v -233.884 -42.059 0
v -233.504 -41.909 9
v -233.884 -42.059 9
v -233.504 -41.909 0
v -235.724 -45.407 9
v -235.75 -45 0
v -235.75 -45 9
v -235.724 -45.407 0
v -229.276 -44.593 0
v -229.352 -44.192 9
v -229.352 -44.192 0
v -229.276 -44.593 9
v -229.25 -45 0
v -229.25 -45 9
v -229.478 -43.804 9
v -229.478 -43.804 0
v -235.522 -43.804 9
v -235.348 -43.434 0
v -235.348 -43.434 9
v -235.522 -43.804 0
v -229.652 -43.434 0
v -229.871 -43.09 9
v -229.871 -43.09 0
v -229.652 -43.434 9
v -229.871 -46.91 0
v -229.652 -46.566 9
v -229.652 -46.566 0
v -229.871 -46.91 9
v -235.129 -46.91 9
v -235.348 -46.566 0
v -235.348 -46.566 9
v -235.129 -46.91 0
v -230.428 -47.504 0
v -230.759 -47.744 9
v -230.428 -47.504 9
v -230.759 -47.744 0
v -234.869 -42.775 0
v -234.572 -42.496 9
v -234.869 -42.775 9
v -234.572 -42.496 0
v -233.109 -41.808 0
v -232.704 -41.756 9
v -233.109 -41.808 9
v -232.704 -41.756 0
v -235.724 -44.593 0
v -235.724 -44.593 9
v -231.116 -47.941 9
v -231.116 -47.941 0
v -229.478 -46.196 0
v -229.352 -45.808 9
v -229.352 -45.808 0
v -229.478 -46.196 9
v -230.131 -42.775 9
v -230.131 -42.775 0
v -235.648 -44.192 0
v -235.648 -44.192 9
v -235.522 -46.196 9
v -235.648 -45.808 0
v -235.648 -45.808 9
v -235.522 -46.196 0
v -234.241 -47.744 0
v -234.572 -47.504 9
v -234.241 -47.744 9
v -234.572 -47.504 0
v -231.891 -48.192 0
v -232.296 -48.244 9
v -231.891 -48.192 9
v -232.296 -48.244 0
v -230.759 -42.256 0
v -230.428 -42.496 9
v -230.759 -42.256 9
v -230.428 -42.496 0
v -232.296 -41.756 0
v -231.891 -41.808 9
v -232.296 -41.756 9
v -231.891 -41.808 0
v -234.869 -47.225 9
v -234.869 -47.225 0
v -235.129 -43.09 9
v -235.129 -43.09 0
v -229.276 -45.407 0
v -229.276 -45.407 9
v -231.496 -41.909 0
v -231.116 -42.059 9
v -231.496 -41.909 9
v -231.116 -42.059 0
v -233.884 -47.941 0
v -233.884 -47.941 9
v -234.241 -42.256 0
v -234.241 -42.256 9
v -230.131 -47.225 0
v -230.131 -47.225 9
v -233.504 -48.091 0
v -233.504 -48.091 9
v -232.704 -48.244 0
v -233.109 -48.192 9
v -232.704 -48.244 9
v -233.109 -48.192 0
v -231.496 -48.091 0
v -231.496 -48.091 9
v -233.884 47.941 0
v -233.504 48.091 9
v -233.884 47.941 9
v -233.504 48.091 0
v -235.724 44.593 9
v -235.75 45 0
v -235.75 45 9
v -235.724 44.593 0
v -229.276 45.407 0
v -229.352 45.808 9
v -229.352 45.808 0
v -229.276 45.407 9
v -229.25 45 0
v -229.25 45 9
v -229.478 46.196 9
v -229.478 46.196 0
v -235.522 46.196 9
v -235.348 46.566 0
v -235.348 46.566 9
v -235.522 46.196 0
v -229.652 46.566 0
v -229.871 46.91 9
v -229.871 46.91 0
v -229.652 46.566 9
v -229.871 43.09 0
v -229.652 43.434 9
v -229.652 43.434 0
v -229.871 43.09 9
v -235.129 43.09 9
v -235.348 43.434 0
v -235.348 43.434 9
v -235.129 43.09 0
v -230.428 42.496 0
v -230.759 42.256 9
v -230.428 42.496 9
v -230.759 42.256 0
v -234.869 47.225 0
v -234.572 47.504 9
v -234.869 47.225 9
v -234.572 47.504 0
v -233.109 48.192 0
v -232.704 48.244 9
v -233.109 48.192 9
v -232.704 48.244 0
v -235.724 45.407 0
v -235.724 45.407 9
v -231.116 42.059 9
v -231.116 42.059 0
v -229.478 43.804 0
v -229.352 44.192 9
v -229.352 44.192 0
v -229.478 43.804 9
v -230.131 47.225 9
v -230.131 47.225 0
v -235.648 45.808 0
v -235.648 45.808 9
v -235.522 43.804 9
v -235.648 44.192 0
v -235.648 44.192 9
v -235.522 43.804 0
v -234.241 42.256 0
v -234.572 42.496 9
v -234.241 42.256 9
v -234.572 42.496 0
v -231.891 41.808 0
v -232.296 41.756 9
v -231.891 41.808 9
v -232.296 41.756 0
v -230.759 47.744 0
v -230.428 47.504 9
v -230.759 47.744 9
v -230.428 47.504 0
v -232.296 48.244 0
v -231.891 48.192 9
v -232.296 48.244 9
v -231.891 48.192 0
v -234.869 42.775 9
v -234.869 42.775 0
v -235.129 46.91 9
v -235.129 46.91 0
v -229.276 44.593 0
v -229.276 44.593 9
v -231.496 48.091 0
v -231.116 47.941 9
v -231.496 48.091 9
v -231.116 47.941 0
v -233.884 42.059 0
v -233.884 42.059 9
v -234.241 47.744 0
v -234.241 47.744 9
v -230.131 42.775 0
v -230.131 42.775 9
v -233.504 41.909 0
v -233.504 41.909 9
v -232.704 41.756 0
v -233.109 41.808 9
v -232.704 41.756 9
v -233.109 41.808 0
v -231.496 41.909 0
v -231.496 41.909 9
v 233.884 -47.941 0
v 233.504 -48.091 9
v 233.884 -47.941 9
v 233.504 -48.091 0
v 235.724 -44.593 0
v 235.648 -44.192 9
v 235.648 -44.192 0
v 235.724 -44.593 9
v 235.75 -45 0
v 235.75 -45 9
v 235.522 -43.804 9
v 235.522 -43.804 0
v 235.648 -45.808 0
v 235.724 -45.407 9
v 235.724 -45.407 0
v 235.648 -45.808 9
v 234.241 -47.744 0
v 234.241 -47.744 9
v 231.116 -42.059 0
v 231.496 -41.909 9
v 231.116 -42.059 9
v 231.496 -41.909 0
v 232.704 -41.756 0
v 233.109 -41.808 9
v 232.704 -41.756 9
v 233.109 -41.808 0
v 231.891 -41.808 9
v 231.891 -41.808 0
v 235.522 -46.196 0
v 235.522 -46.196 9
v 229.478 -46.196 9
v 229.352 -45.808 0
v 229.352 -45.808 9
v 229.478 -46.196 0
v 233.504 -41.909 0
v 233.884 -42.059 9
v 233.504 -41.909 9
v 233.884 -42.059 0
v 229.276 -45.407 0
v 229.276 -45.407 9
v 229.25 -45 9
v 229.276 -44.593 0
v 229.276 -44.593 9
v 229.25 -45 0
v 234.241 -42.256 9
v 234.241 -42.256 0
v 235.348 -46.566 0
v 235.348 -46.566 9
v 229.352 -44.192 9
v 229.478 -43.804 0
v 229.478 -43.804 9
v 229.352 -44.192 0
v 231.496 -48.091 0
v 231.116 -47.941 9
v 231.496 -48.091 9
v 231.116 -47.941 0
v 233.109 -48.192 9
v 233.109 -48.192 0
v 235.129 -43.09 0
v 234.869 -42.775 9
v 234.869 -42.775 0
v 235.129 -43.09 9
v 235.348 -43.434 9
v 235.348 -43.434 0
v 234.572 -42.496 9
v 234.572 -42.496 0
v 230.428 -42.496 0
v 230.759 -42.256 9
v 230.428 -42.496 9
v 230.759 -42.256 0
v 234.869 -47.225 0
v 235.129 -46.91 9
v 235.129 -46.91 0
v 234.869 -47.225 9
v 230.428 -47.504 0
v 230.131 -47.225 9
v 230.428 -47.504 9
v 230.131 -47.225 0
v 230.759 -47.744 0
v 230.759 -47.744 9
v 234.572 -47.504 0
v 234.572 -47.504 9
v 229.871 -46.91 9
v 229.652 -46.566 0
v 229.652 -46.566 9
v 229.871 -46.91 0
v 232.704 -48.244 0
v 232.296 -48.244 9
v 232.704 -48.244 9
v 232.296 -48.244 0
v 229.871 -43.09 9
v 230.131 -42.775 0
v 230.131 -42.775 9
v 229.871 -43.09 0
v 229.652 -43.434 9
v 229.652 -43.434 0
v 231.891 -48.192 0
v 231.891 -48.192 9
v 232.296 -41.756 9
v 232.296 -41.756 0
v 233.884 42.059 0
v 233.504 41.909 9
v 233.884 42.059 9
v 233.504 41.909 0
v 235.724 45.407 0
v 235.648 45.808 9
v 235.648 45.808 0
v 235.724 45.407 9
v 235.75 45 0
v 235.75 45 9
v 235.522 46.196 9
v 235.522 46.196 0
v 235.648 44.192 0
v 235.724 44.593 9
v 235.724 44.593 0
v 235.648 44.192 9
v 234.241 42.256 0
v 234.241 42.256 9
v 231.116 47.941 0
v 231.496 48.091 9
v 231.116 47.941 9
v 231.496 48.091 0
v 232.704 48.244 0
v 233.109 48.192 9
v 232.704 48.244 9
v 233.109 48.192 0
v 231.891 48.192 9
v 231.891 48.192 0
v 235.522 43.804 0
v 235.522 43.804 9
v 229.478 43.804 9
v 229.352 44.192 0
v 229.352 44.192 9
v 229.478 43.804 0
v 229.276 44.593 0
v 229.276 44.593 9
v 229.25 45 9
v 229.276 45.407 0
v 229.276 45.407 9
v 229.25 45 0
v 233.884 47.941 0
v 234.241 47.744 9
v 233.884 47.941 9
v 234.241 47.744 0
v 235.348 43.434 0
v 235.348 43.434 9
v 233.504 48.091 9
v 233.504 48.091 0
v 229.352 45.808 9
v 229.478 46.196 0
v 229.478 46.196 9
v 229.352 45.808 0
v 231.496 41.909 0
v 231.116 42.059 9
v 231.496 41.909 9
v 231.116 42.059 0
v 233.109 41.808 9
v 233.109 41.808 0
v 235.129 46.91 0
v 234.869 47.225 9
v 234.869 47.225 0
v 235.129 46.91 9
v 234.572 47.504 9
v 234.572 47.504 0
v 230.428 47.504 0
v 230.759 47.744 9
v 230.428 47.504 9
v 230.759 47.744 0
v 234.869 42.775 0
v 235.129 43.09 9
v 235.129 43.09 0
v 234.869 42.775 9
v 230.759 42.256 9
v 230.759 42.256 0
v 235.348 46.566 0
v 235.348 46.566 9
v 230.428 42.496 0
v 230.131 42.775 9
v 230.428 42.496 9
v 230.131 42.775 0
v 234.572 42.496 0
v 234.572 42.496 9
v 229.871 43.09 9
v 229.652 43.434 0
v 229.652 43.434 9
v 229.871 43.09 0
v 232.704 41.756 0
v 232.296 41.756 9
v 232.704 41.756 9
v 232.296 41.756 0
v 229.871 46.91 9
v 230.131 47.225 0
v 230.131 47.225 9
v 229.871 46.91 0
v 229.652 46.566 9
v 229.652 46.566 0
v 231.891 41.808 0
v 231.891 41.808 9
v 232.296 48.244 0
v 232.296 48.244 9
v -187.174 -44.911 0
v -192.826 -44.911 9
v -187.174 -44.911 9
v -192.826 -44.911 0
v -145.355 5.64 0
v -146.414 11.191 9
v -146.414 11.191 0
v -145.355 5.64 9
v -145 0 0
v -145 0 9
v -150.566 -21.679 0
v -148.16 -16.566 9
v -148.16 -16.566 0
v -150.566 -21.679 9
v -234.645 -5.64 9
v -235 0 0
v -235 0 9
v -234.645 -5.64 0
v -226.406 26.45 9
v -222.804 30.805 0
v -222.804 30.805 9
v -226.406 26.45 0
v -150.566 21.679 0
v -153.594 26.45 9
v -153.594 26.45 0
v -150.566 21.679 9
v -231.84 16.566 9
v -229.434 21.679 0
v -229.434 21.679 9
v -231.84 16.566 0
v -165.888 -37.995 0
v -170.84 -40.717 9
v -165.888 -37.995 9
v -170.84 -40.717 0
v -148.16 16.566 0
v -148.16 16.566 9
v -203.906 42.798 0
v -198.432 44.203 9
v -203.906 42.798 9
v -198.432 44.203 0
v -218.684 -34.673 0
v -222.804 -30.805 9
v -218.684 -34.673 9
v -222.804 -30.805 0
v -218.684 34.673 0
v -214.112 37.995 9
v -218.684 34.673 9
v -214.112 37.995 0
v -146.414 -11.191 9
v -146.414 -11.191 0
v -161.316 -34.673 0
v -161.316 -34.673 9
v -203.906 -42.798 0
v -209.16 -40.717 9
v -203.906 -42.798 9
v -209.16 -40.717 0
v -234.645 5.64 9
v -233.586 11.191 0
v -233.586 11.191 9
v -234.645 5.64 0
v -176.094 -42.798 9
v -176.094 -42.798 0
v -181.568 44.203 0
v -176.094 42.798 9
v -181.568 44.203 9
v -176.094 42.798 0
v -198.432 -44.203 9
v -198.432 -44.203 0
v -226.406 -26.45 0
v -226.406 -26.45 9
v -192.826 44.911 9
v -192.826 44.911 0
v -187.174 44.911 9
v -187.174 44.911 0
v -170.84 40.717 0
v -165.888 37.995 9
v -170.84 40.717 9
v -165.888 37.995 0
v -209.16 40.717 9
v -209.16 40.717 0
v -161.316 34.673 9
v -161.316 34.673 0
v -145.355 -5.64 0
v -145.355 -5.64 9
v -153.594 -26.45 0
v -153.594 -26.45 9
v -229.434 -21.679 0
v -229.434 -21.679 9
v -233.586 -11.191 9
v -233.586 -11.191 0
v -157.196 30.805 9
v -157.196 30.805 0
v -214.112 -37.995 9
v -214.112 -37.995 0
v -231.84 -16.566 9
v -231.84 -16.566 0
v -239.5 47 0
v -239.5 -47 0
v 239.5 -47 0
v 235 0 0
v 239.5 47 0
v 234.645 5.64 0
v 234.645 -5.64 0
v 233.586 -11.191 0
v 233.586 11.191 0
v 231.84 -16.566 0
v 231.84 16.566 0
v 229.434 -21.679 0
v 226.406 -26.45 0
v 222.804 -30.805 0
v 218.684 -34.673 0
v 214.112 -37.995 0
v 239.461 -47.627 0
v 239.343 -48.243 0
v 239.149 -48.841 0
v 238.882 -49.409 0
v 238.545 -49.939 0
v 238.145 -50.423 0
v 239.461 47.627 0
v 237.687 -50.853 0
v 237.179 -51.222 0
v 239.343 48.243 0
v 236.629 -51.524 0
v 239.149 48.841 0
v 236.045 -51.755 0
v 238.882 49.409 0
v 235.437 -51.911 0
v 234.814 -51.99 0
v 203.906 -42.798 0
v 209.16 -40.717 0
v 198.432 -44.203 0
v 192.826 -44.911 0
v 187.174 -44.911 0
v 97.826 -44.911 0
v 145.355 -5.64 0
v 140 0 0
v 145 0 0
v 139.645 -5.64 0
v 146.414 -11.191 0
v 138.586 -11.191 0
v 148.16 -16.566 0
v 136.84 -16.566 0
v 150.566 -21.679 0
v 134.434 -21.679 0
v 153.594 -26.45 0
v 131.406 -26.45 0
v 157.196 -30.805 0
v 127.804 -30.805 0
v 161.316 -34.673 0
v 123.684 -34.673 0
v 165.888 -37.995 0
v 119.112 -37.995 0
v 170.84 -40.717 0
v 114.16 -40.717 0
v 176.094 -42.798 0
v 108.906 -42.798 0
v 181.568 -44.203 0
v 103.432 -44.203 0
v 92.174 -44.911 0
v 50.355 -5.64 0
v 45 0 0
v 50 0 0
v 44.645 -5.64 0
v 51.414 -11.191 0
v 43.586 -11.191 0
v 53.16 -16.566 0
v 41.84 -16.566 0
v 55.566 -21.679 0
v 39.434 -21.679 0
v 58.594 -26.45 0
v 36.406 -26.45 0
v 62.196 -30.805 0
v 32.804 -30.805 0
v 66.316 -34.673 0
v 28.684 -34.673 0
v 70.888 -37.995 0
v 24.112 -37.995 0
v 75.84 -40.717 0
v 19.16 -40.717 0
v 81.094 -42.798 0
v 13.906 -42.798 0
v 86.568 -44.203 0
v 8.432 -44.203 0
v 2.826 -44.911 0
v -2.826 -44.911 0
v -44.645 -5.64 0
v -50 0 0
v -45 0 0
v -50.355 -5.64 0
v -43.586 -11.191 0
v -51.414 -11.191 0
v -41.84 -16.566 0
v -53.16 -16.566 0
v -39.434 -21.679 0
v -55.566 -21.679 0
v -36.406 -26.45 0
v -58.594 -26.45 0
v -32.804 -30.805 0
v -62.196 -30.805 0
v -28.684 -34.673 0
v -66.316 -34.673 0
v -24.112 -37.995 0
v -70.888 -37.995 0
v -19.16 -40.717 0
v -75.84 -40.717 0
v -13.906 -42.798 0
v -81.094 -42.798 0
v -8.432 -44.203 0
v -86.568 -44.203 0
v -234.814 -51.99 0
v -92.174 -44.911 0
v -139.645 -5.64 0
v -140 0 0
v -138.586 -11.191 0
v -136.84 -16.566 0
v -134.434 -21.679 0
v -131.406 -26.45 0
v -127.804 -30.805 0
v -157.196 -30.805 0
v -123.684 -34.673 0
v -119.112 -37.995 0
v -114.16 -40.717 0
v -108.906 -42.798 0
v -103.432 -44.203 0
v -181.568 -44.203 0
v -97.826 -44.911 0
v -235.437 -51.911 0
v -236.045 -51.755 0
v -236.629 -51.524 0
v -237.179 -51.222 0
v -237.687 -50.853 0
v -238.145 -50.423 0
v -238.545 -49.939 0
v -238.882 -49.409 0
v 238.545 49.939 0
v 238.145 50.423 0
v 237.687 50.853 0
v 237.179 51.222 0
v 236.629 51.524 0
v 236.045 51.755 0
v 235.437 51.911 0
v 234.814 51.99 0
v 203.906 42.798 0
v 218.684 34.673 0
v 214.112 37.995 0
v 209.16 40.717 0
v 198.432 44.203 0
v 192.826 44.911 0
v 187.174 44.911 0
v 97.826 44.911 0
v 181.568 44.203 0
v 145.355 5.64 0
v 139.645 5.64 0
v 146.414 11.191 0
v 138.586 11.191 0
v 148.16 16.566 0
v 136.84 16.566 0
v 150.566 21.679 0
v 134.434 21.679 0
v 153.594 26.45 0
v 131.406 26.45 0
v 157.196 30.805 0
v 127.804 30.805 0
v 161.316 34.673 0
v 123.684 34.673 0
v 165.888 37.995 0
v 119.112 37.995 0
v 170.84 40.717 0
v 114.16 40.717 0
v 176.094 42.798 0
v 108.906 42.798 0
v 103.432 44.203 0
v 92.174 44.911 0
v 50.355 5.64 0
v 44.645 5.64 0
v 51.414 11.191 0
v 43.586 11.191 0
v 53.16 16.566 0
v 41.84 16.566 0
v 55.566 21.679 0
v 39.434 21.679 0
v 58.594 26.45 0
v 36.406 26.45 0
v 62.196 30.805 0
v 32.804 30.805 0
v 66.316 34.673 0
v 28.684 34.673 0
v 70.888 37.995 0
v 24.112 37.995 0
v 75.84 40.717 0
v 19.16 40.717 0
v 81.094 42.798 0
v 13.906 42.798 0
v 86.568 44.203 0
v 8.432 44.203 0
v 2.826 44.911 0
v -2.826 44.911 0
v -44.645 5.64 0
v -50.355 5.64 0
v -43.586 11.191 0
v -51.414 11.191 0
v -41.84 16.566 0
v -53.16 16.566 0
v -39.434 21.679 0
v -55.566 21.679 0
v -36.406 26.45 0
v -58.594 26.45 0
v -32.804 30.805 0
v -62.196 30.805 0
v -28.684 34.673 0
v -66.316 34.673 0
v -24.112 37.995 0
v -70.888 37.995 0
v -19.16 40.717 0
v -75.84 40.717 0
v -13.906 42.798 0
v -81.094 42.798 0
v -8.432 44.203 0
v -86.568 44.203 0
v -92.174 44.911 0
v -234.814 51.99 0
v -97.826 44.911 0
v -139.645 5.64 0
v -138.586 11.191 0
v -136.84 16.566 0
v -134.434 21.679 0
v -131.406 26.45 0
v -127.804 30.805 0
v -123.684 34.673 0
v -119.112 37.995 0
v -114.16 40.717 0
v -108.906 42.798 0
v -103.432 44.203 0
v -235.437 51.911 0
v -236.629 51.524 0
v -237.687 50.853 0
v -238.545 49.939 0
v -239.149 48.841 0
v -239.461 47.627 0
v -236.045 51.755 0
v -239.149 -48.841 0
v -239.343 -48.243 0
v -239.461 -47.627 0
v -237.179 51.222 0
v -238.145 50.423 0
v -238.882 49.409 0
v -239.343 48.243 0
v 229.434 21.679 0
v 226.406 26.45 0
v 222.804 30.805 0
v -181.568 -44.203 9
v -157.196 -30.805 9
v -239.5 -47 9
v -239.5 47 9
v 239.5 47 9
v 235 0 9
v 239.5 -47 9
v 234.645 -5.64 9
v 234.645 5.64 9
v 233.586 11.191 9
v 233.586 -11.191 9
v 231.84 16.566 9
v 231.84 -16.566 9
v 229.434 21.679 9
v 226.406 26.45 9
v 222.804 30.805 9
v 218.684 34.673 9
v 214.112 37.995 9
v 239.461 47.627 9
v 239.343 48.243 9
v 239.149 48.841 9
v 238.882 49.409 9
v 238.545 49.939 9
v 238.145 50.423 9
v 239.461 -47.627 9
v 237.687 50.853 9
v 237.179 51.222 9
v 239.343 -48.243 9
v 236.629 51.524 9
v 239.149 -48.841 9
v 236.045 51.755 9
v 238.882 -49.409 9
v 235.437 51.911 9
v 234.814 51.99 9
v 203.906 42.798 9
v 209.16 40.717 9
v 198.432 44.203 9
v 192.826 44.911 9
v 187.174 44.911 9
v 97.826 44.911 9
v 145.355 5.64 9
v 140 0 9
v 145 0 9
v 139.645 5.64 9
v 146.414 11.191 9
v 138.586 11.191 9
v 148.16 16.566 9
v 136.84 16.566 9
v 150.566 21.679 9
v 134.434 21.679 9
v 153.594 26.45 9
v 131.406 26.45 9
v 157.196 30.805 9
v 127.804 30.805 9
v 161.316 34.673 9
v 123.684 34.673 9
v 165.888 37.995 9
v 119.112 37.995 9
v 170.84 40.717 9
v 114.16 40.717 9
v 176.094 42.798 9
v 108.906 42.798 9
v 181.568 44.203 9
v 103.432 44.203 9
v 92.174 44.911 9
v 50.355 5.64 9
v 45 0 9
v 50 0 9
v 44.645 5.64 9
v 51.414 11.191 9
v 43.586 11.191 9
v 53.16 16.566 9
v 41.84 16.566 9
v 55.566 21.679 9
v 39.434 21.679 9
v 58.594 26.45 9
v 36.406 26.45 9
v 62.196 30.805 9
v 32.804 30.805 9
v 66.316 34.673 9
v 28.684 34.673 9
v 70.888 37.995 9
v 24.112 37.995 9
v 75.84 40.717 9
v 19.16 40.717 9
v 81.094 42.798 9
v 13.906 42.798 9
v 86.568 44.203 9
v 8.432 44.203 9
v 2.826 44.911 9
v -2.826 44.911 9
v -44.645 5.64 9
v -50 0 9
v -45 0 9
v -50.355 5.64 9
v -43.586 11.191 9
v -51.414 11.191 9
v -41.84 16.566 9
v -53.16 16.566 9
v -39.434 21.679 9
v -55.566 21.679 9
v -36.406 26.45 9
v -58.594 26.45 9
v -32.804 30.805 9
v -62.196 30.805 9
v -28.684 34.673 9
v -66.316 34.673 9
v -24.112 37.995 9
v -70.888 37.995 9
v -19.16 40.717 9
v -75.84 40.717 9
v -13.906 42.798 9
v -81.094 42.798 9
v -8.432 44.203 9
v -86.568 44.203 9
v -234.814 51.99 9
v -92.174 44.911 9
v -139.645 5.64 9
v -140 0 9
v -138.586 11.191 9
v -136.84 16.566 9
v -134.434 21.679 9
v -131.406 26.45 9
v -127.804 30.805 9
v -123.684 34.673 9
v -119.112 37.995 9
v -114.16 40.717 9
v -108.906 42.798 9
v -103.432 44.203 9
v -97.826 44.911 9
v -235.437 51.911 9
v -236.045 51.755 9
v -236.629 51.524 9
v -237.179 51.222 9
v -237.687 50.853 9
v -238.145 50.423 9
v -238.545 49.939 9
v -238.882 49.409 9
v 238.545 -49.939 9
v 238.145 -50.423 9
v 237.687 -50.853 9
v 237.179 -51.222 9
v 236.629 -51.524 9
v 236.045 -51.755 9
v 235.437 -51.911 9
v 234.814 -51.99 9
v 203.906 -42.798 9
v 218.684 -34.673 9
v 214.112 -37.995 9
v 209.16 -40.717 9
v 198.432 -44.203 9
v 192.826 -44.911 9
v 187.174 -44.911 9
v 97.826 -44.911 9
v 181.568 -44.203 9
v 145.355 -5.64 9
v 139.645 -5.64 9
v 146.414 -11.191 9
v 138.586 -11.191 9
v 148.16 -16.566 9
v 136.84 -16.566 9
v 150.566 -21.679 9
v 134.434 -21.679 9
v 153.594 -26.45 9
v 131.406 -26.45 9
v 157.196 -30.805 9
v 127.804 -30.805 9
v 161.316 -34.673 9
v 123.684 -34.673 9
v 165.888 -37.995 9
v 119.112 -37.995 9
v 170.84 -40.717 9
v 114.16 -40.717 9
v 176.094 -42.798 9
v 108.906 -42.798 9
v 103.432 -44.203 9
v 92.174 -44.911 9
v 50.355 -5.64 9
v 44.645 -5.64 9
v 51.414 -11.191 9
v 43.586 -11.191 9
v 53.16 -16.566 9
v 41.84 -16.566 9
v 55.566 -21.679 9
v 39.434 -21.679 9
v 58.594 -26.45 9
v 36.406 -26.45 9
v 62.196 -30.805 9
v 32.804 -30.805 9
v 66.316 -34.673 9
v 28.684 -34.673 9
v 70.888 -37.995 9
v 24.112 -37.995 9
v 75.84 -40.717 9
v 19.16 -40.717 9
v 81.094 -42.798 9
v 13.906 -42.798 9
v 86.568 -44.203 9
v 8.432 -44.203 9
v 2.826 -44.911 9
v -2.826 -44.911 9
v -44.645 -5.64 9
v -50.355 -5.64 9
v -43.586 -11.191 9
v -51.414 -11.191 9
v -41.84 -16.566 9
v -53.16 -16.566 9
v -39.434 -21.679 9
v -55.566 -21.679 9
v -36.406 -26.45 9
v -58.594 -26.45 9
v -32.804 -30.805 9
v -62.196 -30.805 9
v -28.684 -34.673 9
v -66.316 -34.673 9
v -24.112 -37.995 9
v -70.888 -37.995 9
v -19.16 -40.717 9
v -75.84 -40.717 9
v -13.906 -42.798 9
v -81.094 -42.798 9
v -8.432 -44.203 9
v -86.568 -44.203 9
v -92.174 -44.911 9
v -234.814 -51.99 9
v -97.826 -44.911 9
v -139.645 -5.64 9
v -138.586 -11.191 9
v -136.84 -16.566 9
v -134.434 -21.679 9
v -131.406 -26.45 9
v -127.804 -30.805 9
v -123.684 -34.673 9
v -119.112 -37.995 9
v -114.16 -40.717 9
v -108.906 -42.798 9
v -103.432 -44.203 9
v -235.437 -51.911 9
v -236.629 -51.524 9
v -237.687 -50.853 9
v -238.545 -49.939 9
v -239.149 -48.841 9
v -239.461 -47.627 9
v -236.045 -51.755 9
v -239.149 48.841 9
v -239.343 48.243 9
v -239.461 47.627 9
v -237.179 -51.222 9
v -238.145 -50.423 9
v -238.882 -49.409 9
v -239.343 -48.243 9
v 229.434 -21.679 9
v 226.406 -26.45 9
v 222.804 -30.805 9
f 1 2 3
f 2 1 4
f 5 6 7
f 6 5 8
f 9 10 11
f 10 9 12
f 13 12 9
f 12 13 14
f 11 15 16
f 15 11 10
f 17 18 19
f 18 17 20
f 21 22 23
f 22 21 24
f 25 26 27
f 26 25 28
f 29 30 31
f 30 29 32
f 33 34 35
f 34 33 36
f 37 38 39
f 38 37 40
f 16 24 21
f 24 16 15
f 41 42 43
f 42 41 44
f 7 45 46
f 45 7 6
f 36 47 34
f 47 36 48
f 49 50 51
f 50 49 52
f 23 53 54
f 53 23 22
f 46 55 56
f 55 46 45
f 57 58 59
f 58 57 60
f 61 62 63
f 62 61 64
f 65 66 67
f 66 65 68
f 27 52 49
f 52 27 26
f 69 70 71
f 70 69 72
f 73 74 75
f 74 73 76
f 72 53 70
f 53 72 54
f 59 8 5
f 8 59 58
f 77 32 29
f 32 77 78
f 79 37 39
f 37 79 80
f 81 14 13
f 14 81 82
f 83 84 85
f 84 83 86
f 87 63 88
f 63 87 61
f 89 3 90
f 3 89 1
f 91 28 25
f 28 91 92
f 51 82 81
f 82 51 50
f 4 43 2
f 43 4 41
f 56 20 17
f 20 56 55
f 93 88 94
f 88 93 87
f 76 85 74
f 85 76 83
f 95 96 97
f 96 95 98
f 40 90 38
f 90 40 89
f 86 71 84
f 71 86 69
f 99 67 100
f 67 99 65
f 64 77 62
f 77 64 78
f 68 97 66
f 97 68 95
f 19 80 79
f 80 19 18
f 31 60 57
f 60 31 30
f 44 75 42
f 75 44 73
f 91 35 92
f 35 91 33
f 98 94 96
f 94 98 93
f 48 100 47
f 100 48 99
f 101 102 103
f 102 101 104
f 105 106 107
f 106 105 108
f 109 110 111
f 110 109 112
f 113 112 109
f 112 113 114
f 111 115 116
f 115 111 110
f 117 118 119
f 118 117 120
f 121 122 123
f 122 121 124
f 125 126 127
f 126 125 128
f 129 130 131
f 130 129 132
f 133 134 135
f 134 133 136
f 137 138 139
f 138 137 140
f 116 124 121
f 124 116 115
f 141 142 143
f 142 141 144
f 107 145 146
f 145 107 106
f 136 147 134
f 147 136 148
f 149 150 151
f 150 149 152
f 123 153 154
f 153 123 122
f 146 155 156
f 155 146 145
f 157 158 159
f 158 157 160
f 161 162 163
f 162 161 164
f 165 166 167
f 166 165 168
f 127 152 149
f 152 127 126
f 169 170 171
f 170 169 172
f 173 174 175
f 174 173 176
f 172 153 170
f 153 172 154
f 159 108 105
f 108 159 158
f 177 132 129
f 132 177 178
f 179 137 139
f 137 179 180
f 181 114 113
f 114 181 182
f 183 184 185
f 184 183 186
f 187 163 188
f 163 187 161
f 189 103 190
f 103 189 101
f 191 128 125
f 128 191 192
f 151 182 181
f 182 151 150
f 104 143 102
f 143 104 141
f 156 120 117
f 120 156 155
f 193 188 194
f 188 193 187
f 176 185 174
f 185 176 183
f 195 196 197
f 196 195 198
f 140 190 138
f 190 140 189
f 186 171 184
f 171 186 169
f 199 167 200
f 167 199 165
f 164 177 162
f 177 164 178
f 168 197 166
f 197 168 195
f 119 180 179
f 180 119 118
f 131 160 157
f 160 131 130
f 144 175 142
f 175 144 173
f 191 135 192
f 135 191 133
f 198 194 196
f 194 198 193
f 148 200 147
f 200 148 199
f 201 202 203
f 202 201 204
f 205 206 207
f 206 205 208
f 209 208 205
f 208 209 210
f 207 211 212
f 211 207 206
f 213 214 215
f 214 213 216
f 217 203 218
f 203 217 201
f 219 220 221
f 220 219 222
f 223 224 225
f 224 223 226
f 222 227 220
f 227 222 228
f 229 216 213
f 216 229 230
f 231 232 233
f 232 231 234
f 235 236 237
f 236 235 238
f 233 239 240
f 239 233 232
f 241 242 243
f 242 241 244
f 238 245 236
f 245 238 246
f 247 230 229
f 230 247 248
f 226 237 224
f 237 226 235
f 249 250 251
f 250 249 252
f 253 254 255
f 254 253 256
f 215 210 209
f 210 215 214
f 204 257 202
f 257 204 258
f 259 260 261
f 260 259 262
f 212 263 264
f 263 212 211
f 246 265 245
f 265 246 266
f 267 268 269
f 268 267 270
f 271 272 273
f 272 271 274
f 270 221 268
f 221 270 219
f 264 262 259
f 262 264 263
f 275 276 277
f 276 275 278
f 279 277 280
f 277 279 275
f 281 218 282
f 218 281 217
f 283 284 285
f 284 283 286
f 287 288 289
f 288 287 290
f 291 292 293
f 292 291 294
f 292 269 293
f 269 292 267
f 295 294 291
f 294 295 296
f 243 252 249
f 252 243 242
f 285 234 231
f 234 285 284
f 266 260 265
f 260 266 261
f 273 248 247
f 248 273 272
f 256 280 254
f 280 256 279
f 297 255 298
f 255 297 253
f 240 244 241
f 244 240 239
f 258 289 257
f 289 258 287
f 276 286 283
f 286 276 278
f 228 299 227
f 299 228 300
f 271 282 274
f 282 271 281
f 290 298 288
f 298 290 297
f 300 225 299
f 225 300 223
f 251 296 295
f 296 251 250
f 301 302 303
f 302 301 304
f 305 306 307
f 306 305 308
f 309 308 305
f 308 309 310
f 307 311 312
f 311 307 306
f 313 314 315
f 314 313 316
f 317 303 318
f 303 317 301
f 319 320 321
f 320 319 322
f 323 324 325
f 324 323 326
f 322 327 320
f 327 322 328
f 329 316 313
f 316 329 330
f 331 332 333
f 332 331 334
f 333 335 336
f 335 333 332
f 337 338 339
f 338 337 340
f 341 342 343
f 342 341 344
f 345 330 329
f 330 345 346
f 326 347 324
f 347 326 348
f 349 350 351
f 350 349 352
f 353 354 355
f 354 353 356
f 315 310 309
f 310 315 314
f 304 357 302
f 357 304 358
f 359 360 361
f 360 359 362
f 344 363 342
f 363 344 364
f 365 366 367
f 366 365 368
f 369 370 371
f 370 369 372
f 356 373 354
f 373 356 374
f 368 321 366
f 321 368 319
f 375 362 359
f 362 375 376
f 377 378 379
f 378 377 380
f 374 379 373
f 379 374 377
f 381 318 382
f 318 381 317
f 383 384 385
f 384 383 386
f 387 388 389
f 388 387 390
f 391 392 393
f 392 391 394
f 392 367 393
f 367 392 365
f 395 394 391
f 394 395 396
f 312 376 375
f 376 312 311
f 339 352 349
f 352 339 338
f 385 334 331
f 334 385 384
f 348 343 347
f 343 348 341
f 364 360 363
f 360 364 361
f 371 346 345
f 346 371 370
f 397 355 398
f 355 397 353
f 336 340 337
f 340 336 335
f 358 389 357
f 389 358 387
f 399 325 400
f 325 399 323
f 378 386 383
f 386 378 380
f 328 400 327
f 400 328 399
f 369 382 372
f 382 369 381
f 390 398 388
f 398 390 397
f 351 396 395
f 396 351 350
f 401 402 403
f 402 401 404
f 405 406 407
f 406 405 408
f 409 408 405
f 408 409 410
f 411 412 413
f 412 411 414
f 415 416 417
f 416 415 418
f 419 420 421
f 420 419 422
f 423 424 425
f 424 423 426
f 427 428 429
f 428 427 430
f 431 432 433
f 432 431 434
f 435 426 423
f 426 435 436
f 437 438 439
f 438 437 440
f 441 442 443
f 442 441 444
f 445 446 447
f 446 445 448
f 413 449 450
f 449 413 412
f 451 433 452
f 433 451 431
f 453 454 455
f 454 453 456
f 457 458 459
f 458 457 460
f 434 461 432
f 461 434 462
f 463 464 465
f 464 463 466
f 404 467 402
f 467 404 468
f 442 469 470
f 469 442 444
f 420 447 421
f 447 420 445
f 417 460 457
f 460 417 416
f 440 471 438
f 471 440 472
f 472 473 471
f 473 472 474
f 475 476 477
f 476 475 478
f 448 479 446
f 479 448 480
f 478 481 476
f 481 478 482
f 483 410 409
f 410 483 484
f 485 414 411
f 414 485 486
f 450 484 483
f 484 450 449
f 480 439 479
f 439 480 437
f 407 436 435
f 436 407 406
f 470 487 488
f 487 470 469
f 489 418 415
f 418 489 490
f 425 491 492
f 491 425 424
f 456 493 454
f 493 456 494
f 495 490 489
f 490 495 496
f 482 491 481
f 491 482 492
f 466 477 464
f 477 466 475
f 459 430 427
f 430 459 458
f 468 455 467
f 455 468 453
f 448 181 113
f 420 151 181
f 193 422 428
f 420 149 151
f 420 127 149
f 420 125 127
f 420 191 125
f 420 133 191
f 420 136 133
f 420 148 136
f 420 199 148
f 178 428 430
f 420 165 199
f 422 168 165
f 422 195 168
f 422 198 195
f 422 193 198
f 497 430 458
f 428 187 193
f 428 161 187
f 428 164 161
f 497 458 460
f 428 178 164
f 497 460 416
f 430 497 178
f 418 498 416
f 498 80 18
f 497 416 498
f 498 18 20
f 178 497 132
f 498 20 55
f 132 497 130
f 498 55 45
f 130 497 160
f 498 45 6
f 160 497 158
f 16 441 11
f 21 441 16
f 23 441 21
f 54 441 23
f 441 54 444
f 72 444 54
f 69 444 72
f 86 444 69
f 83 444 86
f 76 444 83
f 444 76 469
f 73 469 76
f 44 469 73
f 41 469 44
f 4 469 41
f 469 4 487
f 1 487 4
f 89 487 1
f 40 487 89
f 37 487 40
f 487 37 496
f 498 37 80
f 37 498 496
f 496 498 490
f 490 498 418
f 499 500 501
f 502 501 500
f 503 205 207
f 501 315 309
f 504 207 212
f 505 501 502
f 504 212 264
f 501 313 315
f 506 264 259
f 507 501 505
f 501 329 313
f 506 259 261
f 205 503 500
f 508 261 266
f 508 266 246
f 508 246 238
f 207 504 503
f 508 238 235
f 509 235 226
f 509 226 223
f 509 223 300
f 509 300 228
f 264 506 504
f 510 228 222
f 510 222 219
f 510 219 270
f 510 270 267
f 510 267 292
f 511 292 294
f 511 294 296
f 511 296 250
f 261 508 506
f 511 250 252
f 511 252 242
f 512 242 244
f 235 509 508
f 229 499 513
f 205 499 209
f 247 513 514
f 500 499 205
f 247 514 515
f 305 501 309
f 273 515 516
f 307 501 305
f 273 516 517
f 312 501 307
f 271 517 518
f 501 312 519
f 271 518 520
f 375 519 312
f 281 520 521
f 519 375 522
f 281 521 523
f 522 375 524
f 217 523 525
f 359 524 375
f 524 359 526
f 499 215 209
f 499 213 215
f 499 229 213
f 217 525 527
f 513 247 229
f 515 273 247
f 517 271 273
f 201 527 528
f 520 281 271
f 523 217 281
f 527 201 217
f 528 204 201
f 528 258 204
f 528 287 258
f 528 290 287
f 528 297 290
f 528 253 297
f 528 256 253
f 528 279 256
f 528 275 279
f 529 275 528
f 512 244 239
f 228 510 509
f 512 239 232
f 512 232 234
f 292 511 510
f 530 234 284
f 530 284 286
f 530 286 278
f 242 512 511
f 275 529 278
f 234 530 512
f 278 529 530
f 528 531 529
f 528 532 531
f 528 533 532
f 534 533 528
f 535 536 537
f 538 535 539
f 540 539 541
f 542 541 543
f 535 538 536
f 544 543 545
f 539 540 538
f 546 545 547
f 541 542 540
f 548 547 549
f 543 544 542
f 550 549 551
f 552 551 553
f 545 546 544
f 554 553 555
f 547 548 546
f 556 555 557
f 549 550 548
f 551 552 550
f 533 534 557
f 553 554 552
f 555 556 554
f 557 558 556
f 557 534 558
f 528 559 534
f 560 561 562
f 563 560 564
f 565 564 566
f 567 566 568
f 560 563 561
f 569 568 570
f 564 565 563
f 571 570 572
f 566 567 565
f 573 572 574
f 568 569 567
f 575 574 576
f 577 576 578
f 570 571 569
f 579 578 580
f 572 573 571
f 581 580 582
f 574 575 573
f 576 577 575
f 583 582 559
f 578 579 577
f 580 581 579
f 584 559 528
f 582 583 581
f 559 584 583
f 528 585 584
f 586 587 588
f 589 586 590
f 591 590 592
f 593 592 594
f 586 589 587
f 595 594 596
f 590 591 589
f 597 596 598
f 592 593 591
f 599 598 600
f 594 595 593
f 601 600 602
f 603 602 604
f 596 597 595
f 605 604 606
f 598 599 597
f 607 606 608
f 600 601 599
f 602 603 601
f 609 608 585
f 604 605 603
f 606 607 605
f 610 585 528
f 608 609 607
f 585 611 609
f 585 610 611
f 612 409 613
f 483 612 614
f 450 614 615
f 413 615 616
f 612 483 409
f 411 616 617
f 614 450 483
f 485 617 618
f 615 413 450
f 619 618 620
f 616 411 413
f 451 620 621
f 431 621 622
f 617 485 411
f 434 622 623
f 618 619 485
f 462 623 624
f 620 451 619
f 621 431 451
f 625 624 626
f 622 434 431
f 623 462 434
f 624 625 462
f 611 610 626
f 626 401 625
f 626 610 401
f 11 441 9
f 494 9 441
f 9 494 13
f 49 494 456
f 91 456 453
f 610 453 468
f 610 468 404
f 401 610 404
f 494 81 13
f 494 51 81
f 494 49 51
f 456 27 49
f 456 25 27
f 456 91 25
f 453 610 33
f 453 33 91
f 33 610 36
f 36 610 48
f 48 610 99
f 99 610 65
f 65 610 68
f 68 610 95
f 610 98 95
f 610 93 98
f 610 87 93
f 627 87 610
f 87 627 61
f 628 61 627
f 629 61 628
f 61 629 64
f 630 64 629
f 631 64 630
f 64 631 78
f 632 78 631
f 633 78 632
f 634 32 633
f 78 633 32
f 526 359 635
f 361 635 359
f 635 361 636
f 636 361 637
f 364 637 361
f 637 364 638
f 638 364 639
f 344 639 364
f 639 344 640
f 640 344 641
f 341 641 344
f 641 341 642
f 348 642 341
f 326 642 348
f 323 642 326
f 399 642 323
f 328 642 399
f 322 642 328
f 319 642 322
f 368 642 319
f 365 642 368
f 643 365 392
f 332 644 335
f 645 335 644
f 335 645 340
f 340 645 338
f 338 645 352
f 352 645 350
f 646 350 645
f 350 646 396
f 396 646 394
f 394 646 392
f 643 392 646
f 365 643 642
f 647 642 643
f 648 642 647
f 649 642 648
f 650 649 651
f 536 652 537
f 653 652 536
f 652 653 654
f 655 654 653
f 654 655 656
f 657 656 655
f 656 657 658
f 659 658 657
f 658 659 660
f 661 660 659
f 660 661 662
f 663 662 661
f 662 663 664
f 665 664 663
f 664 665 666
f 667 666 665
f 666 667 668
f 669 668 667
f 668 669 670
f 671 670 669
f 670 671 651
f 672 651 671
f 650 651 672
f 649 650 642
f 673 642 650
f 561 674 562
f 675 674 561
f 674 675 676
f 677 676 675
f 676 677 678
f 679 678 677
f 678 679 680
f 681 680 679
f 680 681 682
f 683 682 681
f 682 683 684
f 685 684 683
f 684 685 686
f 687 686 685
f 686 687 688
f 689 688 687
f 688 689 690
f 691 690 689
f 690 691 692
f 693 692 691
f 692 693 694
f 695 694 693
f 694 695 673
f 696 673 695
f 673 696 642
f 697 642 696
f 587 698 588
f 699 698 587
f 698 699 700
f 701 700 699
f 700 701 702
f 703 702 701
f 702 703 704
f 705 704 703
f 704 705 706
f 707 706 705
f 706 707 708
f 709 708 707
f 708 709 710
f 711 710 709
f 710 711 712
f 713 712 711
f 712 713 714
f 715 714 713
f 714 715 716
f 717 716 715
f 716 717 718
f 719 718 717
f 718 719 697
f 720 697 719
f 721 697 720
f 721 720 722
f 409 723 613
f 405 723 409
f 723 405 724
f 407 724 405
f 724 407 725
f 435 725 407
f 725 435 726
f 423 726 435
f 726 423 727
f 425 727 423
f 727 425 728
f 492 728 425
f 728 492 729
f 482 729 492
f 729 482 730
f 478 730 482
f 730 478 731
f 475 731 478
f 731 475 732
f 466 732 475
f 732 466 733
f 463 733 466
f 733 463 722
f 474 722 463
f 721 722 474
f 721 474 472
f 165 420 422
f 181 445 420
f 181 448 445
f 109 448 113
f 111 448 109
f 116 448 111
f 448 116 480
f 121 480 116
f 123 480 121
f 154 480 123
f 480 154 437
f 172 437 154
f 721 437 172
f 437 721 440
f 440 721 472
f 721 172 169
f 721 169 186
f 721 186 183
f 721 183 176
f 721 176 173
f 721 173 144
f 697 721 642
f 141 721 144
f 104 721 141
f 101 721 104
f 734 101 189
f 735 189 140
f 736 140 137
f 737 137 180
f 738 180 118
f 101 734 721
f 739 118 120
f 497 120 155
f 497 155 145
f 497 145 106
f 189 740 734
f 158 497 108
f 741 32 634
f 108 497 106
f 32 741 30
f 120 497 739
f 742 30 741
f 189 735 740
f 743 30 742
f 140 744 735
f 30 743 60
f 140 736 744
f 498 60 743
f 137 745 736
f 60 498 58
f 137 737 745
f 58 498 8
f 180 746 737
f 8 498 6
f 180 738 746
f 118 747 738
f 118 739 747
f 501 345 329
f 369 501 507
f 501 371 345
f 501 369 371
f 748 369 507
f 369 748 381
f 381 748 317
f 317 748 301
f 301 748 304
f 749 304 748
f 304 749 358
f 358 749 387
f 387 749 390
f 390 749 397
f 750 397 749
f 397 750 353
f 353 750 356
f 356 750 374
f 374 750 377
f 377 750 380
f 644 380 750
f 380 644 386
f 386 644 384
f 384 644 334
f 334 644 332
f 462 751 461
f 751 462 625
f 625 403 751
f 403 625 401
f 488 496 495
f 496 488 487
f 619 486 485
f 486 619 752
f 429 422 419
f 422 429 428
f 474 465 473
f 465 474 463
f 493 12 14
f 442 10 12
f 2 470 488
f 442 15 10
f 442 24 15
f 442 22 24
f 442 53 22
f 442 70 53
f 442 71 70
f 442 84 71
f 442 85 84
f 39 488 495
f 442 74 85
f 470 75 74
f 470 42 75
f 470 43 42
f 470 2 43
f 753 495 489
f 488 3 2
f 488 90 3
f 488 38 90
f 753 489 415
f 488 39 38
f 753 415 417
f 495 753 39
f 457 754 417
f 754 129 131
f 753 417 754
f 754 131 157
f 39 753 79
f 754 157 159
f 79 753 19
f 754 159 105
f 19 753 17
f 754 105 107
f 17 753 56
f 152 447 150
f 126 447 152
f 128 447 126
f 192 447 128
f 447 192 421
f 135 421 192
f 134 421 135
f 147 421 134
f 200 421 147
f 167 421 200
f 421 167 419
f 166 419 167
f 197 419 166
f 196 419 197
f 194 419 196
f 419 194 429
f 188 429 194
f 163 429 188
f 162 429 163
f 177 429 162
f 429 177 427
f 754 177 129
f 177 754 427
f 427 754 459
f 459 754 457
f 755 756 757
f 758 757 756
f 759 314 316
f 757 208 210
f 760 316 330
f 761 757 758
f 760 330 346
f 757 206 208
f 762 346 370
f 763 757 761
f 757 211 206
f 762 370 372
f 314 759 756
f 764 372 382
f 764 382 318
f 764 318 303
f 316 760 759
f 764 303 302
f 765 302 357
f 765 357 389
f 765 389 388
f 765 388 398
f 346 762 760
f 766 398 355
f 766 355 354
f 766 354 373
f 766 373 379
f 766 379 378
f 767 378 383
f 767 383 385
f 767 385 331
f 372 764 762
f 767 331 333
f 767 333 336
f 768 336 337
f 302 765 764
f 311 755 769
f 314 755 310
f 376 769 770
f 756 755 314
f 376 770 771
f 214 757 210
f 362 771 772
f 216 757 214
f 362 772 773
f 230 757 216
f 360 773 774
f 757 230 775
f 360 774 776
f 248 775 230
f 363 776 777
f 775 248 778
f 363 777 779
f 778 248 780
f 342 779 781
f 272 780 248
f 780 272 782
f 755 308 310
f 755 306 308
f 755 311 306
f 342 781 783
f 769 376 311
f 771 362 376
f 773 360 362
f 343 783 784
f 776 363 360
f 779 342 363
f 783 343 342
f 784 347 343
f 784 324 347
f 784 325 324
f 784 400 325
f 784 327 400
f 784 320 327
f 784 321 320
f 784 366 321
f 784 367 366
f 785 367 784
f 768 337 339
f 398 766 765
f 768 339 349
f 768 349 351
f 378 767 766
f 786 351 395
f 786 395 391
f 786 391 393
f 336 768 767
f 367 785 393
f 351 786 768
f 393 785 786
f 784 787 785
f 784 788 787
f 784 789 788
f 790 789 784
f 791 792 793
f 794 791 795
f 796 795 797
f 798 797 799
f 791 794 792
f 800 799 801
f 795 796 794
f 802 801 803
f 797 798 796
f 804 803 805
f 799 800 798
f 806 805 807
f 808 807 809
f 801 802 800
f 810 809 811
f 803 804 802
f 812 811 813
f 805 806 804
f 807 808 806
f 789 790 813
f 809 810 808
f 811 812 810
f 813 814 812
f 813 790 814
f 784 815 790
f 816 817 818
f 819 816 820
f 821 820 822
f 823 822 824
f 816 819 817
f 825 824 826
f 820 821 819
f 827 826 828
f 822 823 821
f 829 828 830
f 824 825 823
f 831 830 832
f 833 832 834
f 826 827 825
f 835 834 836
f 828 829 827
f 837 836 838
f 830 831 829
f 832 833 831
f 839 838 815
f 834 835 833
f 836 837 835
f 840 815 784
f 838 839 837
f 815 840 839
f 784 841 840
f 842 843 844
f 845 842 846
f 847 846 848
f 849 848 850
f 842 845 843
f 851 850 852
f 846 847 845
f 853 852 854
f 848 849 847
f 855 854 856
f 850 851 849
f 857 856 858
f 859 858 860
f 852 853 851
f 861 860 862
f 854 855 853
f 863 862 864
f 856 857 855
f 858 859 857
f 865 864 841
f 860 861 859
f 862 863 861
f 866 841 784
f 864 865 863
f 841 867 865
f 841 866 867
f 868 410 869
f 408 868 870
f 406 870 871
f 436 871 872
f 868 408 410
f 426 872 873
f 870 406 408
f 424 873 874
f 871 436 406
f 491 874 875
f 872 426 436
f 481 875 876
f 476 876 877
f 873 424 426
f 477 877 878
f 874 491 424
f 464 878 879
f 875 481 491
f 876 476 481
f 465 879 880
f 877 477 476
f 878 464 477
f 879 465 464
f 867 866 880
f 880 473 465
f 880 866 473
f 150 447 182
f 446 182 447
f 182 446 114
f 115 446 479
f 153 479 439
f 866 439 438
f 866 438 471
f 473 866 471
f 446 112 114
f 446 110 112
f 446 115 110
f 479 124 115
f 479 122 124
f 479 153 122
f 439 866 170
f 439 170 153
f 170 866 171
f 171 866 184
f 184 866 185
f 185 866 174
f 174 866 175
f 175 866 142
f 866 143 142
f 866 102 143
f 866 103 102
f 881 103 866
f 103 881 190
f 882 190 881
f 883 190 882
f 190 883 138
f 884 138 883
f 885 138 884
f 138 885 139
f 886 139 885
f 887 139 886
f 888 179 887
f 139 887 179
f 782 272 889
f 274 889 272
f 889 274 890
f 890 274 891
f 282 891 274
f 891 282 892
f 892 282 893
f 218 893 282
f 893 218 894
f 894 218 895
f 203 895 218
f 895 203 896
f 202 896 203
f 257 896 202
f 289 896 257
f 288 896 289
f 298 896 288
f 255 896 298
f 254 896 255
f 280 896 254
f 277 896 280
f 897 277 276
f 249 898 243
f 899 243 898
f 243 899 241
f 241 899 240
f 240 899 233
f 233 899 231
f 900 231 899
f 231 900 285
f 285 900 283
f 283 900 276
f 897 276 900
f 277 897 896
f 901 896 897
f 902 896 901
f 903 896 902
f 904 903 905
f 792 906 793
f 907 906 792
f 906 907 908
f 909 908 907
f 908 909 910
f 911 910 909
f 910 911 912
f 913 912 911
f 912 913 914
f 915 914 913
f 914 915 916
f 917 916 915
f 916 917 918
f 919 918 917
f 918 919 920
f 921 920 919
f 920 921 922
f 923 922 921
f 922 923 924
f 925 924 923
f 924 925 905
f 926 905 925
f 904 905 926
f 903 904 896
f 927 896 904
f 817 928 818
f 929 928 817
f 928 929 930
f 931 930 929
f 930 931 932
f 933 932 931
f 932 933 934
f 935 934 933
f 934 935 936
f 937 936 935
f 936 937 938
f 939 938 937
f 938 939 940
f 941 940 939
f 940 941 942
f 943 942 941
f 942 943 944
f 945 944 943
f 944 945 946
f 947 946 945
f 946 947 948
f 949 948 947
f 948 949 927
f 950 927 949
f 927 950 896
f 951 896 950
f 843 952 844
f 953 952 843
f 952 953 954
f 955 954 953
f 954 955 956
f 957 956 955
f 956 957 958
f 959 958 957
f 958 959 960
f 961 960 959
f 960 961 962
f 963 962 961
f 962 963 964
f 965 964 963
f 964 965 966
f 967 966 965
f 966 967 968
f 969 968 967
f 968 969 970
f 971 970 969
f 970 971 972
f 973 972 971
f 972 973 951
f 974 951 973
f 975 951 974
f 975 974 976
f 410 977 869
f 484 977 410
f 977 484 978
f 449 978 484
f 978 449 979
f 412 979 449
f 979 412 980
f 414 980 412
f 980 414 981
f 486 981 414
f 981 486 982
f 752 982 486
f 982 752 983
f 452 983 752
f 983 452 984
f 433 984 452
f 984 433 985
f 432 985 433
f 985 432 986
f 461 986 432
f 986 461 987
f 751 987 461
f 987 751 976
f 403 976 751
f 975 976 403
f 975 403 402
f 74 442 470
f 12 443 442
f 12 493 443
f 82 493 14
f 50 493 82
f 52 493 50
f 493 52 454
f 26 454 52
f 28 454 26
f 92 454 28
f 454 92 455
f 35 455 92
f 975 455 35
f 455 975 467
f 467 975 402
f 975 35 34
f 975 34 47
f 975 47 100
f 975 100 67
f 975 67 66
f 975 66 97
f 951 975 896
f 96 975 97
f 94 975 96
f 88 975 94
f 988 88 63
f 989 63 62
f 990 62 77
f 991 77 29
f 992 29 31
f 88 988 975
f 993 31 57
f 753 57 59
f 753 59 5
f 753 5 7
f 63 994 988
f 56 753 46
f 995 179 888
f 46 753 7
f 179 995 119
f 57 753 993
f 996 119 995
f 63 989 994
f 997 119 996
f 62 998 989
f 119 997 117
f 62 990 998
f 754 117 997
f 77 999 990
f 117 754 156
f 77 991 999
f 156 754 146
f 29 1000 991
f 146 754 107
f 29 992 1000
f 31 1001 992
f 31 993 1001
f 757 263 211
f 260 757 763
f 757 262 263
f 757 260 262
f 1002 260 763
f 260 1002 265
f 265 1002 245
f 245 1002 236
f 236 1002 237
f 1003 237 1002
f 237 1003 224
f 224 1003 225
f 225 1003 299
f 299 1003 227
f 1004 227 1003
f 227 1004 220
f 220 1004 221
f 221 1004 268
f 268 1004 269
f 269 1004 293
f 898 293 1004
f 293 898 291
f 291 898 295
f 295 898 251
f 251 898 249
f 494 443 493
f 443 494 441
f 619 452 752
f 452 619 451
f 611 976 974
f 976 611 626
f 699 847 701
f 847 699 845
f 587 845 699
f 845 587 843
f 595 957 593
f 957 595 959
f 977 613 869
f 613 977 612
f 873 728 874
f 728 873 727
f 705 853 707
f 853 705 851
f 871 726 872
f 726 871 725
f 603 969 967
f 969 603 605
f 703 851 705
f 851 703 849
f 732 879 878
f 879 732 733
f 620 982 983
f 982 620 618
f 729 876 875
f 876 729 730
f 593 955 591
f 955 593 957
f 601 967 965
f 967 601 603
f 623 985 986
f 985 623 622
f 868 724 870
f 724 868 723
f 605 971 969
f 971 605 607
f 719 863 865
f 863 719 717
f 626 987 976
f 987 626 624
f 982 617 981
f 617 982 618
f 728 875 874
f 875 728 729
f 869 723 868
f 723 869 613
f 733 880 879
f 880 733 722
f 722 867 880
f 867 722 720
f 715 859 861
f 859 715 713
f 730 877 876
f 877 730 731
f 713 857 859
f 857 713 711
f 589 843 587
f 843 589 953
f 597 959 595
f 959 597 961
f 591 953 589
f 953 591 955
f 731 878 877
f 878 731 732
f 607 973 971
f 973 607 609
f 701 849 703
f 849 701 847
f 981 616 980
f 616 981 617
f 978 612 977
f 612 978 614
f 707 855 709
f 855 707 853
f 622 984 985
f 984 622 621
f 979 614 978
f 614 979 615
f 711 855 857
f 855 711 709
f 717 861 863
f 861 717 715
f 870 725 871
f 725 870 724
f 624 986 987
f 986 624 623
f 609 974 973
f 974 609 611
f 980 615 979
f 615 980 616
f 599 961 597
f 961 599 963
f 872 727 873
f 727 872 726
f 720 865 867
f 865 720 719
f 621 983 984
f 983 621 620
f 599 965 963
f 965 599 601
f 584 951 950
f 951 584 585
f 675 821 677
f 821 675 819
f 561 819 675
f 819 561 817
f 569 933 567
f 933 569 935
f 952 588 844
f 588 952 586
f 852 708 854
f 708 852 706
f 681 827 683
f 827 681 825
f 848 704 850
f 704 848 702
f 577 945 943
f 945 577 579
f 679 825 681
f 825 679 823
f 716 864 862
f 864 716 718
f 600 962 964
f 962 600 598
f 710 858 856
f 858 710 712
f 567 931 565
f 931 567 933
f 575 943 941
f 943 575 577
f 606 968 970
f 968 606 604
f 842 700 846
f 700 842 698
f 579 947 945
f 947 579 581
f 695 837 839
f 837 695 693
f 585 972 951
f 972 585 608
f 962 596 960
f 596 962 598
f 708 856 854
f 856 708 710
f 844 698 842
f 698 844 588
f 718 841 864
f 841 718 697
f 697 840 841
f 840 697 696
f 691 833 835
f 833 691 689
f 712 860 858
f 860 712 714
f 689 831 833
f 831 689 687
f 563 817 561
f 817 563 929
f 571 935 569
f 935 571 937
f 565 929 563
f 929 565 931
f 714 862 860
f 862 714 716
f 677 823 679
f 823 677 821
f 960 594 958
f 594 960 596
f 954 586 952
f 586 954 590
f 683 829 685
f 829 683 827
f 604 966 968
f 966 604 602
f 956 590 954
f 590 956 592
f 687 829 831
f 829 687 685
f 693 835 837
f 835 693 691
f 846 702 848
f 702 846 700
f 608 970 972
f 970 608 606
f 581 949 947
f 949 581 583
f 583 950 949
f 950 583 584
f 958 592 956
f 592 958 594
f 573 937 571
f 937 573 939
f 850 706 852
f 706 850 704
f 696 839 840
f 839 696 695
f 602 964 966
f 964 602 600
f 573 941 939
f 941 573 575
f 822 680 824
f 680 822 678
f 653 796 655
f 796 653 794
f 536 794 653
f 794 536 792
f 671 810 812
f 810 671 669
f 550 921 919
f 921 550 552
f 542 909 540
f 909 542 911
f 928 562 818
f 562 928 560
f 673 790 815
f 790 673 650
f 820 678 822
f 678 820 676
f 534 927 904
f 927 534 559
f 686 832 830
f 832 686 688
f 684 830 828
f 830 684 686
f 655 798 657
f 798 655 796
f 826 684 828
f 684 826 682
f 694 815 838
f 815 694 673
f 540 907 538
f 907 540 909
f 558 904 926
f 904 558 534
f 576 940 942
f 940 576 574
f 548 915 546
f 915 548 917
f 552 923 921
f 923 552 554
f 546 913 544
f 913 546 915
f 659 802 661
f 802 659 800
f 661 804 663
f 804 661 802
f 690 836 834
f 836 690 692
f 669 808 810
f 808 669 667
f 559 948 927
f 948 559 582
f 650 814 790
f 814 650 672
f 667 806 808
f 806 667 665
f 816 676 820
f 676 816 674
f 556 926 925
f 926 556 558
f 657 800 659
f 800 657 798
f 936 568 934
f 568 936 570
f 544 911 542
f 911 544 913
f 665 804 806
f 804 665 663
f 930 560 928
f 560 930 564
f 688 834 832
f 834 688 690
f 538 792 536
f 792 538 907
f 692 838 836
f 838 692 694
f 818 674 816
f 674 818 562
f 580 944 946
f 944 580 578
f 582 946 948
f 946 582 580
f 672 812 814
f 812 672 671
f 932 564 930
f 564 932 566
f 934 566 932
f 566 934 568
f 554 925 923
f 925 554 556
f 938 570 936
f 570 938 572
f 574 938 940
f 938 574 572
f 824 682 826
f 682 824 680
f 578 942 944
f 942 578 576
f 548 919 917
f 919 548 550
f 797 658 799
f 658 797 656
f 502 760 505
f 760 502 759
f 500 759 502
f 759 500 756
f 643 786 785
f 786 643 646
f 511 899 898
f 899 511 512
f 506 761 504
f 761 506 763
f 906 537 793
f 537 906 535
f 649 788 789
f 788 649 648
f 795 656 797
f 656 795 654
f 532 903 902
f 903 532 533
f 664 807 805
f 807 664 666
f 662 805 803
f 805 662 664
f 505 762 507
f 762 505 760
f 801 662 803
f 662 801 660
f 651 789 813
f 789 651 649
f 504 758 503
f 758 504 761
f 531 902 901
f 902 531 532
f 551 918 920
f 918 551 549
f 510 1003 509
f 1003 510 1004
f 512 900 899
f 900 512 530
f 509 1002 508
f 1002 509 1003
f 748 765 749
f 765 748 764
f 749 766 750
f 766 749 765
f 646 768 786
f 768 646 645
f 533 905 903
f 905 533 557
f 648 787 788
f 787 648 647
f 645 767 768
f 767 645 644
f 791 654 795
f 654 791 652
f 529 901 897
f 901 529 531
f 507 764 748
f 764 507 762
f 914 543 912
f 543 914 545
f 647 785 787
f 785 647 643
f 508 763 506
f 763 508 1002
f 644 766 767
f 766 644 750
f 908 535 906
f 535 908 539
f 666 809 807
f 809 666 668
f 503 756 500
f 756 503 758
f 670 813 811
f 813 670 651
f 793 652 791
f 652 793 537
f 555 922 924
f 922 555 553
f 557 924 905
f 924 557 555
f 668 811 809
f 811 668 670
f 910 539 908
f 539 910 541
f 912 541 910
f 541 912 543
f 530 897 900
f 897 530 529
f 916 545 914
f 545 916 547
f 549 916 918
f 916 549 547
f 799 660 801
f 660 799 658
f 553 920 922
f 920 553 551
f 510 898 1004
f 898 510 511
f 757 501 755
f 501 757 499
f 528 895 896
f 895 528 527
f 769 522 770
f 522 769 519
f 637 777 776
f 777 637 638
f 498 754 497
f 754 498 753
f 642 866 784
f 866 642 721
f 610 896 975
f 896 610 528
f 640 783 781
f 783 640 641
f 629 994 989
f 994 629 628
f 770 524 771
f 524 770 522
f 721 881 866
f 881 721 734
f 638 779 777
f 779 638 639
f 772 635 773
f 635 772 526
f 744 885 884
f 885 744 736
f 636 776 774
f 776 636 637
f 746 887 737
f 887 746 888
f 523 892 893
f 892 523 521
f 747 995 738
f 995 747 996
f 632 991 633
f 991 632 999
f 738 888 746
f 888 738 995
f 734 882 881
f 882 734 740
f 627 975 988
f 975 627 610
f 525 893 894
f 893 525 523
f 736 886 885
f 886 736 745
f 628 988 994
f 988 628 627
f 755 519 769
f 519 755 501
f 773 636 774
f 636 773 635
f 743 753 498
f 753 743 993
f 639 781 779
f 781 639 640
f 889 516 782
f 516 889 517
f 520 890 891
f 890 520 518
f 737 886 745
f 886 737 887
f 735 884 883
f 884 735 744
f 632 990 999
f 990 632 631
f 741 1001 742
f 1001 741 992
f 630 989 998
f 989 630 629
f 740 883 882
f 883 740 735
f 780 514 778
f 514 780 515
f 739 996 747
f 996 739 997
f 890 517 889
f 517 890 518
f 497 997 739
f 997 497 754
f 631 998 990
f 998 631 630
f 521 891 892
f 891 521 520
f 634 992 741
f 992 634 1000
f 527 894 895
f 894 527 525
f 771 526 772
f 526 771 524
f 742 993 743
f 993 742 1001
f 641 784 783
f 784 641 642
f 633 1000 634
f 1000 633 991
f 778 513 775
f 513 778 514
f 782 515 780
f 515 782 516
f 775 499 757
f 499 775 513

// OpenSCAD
$fn = 50;

difference() {
	union() {
		hull() {
			translate(v = [-234.5, 47.0, 0]) {
				cylinder(h = 9, r = 5);
			}
			translate(v = [234.5, 47.0, 0]) {
				cylinder(h = 9, r = 5);
			}
			translate(v = [-234.5, -47.0, 0]) {
				cylinder(h = 9, r = 5);
			}
			translate(v = [234.5, -47.0, 0]) {
				cylinder(h = 9, r = 5);
			}
		}
	}
	union() {
		translate(v = [-232.5, -45.0, -100.0]) {
			cylinder(h = 200, r = 3.25);
		}
		translate(v = [-232.5, 45.0, -100.0]) {
			cylinder(h = 200, r = 3.25);
		}
		translate(v = [232.5, -45.0, -100.0]) {
			cylinder(h = 200, r = 3.25);
		}
		translate(v = [232.5, 45.0, -100.0]) {
			cylinder(h = 200, r = 3.25);
		}
		translate(v = [-232.5, -45.0, -100.0]) {
			cylinder(h = 200, r = 1.8);
		}
		translate(v = [-232.5, 45.0, -100.0]) {
			cylinder(h = 200, r = 1.8);
		}
		translate(v = [232.5, -45.0, -100.0]) {
			cylinder(h = 200, r = 1.8);
		}
		translate(v = [232.5, 45.0, -100.0]) {
			cylinder(h = 200, r = 1.8);
		}
		translate(v = [-190.0, 0, 0.0]) {
			cylinder(h = 9, r = 45.0);
		}
		translate(v = [-95.0, 0, 0.0]) {
			cylinder(h = 9, r = 45.0);
		}
		cylinder(h = 9, r = 45.0);
		translate(v = [95.0, 0, 0.0]) {
			cylinder(h = 9, r = 45.0);
		}
		translate(v = [190.0, 0, 0.0]) {
			cylinder(h = 9, r = 45.0);
		}
	}
}
